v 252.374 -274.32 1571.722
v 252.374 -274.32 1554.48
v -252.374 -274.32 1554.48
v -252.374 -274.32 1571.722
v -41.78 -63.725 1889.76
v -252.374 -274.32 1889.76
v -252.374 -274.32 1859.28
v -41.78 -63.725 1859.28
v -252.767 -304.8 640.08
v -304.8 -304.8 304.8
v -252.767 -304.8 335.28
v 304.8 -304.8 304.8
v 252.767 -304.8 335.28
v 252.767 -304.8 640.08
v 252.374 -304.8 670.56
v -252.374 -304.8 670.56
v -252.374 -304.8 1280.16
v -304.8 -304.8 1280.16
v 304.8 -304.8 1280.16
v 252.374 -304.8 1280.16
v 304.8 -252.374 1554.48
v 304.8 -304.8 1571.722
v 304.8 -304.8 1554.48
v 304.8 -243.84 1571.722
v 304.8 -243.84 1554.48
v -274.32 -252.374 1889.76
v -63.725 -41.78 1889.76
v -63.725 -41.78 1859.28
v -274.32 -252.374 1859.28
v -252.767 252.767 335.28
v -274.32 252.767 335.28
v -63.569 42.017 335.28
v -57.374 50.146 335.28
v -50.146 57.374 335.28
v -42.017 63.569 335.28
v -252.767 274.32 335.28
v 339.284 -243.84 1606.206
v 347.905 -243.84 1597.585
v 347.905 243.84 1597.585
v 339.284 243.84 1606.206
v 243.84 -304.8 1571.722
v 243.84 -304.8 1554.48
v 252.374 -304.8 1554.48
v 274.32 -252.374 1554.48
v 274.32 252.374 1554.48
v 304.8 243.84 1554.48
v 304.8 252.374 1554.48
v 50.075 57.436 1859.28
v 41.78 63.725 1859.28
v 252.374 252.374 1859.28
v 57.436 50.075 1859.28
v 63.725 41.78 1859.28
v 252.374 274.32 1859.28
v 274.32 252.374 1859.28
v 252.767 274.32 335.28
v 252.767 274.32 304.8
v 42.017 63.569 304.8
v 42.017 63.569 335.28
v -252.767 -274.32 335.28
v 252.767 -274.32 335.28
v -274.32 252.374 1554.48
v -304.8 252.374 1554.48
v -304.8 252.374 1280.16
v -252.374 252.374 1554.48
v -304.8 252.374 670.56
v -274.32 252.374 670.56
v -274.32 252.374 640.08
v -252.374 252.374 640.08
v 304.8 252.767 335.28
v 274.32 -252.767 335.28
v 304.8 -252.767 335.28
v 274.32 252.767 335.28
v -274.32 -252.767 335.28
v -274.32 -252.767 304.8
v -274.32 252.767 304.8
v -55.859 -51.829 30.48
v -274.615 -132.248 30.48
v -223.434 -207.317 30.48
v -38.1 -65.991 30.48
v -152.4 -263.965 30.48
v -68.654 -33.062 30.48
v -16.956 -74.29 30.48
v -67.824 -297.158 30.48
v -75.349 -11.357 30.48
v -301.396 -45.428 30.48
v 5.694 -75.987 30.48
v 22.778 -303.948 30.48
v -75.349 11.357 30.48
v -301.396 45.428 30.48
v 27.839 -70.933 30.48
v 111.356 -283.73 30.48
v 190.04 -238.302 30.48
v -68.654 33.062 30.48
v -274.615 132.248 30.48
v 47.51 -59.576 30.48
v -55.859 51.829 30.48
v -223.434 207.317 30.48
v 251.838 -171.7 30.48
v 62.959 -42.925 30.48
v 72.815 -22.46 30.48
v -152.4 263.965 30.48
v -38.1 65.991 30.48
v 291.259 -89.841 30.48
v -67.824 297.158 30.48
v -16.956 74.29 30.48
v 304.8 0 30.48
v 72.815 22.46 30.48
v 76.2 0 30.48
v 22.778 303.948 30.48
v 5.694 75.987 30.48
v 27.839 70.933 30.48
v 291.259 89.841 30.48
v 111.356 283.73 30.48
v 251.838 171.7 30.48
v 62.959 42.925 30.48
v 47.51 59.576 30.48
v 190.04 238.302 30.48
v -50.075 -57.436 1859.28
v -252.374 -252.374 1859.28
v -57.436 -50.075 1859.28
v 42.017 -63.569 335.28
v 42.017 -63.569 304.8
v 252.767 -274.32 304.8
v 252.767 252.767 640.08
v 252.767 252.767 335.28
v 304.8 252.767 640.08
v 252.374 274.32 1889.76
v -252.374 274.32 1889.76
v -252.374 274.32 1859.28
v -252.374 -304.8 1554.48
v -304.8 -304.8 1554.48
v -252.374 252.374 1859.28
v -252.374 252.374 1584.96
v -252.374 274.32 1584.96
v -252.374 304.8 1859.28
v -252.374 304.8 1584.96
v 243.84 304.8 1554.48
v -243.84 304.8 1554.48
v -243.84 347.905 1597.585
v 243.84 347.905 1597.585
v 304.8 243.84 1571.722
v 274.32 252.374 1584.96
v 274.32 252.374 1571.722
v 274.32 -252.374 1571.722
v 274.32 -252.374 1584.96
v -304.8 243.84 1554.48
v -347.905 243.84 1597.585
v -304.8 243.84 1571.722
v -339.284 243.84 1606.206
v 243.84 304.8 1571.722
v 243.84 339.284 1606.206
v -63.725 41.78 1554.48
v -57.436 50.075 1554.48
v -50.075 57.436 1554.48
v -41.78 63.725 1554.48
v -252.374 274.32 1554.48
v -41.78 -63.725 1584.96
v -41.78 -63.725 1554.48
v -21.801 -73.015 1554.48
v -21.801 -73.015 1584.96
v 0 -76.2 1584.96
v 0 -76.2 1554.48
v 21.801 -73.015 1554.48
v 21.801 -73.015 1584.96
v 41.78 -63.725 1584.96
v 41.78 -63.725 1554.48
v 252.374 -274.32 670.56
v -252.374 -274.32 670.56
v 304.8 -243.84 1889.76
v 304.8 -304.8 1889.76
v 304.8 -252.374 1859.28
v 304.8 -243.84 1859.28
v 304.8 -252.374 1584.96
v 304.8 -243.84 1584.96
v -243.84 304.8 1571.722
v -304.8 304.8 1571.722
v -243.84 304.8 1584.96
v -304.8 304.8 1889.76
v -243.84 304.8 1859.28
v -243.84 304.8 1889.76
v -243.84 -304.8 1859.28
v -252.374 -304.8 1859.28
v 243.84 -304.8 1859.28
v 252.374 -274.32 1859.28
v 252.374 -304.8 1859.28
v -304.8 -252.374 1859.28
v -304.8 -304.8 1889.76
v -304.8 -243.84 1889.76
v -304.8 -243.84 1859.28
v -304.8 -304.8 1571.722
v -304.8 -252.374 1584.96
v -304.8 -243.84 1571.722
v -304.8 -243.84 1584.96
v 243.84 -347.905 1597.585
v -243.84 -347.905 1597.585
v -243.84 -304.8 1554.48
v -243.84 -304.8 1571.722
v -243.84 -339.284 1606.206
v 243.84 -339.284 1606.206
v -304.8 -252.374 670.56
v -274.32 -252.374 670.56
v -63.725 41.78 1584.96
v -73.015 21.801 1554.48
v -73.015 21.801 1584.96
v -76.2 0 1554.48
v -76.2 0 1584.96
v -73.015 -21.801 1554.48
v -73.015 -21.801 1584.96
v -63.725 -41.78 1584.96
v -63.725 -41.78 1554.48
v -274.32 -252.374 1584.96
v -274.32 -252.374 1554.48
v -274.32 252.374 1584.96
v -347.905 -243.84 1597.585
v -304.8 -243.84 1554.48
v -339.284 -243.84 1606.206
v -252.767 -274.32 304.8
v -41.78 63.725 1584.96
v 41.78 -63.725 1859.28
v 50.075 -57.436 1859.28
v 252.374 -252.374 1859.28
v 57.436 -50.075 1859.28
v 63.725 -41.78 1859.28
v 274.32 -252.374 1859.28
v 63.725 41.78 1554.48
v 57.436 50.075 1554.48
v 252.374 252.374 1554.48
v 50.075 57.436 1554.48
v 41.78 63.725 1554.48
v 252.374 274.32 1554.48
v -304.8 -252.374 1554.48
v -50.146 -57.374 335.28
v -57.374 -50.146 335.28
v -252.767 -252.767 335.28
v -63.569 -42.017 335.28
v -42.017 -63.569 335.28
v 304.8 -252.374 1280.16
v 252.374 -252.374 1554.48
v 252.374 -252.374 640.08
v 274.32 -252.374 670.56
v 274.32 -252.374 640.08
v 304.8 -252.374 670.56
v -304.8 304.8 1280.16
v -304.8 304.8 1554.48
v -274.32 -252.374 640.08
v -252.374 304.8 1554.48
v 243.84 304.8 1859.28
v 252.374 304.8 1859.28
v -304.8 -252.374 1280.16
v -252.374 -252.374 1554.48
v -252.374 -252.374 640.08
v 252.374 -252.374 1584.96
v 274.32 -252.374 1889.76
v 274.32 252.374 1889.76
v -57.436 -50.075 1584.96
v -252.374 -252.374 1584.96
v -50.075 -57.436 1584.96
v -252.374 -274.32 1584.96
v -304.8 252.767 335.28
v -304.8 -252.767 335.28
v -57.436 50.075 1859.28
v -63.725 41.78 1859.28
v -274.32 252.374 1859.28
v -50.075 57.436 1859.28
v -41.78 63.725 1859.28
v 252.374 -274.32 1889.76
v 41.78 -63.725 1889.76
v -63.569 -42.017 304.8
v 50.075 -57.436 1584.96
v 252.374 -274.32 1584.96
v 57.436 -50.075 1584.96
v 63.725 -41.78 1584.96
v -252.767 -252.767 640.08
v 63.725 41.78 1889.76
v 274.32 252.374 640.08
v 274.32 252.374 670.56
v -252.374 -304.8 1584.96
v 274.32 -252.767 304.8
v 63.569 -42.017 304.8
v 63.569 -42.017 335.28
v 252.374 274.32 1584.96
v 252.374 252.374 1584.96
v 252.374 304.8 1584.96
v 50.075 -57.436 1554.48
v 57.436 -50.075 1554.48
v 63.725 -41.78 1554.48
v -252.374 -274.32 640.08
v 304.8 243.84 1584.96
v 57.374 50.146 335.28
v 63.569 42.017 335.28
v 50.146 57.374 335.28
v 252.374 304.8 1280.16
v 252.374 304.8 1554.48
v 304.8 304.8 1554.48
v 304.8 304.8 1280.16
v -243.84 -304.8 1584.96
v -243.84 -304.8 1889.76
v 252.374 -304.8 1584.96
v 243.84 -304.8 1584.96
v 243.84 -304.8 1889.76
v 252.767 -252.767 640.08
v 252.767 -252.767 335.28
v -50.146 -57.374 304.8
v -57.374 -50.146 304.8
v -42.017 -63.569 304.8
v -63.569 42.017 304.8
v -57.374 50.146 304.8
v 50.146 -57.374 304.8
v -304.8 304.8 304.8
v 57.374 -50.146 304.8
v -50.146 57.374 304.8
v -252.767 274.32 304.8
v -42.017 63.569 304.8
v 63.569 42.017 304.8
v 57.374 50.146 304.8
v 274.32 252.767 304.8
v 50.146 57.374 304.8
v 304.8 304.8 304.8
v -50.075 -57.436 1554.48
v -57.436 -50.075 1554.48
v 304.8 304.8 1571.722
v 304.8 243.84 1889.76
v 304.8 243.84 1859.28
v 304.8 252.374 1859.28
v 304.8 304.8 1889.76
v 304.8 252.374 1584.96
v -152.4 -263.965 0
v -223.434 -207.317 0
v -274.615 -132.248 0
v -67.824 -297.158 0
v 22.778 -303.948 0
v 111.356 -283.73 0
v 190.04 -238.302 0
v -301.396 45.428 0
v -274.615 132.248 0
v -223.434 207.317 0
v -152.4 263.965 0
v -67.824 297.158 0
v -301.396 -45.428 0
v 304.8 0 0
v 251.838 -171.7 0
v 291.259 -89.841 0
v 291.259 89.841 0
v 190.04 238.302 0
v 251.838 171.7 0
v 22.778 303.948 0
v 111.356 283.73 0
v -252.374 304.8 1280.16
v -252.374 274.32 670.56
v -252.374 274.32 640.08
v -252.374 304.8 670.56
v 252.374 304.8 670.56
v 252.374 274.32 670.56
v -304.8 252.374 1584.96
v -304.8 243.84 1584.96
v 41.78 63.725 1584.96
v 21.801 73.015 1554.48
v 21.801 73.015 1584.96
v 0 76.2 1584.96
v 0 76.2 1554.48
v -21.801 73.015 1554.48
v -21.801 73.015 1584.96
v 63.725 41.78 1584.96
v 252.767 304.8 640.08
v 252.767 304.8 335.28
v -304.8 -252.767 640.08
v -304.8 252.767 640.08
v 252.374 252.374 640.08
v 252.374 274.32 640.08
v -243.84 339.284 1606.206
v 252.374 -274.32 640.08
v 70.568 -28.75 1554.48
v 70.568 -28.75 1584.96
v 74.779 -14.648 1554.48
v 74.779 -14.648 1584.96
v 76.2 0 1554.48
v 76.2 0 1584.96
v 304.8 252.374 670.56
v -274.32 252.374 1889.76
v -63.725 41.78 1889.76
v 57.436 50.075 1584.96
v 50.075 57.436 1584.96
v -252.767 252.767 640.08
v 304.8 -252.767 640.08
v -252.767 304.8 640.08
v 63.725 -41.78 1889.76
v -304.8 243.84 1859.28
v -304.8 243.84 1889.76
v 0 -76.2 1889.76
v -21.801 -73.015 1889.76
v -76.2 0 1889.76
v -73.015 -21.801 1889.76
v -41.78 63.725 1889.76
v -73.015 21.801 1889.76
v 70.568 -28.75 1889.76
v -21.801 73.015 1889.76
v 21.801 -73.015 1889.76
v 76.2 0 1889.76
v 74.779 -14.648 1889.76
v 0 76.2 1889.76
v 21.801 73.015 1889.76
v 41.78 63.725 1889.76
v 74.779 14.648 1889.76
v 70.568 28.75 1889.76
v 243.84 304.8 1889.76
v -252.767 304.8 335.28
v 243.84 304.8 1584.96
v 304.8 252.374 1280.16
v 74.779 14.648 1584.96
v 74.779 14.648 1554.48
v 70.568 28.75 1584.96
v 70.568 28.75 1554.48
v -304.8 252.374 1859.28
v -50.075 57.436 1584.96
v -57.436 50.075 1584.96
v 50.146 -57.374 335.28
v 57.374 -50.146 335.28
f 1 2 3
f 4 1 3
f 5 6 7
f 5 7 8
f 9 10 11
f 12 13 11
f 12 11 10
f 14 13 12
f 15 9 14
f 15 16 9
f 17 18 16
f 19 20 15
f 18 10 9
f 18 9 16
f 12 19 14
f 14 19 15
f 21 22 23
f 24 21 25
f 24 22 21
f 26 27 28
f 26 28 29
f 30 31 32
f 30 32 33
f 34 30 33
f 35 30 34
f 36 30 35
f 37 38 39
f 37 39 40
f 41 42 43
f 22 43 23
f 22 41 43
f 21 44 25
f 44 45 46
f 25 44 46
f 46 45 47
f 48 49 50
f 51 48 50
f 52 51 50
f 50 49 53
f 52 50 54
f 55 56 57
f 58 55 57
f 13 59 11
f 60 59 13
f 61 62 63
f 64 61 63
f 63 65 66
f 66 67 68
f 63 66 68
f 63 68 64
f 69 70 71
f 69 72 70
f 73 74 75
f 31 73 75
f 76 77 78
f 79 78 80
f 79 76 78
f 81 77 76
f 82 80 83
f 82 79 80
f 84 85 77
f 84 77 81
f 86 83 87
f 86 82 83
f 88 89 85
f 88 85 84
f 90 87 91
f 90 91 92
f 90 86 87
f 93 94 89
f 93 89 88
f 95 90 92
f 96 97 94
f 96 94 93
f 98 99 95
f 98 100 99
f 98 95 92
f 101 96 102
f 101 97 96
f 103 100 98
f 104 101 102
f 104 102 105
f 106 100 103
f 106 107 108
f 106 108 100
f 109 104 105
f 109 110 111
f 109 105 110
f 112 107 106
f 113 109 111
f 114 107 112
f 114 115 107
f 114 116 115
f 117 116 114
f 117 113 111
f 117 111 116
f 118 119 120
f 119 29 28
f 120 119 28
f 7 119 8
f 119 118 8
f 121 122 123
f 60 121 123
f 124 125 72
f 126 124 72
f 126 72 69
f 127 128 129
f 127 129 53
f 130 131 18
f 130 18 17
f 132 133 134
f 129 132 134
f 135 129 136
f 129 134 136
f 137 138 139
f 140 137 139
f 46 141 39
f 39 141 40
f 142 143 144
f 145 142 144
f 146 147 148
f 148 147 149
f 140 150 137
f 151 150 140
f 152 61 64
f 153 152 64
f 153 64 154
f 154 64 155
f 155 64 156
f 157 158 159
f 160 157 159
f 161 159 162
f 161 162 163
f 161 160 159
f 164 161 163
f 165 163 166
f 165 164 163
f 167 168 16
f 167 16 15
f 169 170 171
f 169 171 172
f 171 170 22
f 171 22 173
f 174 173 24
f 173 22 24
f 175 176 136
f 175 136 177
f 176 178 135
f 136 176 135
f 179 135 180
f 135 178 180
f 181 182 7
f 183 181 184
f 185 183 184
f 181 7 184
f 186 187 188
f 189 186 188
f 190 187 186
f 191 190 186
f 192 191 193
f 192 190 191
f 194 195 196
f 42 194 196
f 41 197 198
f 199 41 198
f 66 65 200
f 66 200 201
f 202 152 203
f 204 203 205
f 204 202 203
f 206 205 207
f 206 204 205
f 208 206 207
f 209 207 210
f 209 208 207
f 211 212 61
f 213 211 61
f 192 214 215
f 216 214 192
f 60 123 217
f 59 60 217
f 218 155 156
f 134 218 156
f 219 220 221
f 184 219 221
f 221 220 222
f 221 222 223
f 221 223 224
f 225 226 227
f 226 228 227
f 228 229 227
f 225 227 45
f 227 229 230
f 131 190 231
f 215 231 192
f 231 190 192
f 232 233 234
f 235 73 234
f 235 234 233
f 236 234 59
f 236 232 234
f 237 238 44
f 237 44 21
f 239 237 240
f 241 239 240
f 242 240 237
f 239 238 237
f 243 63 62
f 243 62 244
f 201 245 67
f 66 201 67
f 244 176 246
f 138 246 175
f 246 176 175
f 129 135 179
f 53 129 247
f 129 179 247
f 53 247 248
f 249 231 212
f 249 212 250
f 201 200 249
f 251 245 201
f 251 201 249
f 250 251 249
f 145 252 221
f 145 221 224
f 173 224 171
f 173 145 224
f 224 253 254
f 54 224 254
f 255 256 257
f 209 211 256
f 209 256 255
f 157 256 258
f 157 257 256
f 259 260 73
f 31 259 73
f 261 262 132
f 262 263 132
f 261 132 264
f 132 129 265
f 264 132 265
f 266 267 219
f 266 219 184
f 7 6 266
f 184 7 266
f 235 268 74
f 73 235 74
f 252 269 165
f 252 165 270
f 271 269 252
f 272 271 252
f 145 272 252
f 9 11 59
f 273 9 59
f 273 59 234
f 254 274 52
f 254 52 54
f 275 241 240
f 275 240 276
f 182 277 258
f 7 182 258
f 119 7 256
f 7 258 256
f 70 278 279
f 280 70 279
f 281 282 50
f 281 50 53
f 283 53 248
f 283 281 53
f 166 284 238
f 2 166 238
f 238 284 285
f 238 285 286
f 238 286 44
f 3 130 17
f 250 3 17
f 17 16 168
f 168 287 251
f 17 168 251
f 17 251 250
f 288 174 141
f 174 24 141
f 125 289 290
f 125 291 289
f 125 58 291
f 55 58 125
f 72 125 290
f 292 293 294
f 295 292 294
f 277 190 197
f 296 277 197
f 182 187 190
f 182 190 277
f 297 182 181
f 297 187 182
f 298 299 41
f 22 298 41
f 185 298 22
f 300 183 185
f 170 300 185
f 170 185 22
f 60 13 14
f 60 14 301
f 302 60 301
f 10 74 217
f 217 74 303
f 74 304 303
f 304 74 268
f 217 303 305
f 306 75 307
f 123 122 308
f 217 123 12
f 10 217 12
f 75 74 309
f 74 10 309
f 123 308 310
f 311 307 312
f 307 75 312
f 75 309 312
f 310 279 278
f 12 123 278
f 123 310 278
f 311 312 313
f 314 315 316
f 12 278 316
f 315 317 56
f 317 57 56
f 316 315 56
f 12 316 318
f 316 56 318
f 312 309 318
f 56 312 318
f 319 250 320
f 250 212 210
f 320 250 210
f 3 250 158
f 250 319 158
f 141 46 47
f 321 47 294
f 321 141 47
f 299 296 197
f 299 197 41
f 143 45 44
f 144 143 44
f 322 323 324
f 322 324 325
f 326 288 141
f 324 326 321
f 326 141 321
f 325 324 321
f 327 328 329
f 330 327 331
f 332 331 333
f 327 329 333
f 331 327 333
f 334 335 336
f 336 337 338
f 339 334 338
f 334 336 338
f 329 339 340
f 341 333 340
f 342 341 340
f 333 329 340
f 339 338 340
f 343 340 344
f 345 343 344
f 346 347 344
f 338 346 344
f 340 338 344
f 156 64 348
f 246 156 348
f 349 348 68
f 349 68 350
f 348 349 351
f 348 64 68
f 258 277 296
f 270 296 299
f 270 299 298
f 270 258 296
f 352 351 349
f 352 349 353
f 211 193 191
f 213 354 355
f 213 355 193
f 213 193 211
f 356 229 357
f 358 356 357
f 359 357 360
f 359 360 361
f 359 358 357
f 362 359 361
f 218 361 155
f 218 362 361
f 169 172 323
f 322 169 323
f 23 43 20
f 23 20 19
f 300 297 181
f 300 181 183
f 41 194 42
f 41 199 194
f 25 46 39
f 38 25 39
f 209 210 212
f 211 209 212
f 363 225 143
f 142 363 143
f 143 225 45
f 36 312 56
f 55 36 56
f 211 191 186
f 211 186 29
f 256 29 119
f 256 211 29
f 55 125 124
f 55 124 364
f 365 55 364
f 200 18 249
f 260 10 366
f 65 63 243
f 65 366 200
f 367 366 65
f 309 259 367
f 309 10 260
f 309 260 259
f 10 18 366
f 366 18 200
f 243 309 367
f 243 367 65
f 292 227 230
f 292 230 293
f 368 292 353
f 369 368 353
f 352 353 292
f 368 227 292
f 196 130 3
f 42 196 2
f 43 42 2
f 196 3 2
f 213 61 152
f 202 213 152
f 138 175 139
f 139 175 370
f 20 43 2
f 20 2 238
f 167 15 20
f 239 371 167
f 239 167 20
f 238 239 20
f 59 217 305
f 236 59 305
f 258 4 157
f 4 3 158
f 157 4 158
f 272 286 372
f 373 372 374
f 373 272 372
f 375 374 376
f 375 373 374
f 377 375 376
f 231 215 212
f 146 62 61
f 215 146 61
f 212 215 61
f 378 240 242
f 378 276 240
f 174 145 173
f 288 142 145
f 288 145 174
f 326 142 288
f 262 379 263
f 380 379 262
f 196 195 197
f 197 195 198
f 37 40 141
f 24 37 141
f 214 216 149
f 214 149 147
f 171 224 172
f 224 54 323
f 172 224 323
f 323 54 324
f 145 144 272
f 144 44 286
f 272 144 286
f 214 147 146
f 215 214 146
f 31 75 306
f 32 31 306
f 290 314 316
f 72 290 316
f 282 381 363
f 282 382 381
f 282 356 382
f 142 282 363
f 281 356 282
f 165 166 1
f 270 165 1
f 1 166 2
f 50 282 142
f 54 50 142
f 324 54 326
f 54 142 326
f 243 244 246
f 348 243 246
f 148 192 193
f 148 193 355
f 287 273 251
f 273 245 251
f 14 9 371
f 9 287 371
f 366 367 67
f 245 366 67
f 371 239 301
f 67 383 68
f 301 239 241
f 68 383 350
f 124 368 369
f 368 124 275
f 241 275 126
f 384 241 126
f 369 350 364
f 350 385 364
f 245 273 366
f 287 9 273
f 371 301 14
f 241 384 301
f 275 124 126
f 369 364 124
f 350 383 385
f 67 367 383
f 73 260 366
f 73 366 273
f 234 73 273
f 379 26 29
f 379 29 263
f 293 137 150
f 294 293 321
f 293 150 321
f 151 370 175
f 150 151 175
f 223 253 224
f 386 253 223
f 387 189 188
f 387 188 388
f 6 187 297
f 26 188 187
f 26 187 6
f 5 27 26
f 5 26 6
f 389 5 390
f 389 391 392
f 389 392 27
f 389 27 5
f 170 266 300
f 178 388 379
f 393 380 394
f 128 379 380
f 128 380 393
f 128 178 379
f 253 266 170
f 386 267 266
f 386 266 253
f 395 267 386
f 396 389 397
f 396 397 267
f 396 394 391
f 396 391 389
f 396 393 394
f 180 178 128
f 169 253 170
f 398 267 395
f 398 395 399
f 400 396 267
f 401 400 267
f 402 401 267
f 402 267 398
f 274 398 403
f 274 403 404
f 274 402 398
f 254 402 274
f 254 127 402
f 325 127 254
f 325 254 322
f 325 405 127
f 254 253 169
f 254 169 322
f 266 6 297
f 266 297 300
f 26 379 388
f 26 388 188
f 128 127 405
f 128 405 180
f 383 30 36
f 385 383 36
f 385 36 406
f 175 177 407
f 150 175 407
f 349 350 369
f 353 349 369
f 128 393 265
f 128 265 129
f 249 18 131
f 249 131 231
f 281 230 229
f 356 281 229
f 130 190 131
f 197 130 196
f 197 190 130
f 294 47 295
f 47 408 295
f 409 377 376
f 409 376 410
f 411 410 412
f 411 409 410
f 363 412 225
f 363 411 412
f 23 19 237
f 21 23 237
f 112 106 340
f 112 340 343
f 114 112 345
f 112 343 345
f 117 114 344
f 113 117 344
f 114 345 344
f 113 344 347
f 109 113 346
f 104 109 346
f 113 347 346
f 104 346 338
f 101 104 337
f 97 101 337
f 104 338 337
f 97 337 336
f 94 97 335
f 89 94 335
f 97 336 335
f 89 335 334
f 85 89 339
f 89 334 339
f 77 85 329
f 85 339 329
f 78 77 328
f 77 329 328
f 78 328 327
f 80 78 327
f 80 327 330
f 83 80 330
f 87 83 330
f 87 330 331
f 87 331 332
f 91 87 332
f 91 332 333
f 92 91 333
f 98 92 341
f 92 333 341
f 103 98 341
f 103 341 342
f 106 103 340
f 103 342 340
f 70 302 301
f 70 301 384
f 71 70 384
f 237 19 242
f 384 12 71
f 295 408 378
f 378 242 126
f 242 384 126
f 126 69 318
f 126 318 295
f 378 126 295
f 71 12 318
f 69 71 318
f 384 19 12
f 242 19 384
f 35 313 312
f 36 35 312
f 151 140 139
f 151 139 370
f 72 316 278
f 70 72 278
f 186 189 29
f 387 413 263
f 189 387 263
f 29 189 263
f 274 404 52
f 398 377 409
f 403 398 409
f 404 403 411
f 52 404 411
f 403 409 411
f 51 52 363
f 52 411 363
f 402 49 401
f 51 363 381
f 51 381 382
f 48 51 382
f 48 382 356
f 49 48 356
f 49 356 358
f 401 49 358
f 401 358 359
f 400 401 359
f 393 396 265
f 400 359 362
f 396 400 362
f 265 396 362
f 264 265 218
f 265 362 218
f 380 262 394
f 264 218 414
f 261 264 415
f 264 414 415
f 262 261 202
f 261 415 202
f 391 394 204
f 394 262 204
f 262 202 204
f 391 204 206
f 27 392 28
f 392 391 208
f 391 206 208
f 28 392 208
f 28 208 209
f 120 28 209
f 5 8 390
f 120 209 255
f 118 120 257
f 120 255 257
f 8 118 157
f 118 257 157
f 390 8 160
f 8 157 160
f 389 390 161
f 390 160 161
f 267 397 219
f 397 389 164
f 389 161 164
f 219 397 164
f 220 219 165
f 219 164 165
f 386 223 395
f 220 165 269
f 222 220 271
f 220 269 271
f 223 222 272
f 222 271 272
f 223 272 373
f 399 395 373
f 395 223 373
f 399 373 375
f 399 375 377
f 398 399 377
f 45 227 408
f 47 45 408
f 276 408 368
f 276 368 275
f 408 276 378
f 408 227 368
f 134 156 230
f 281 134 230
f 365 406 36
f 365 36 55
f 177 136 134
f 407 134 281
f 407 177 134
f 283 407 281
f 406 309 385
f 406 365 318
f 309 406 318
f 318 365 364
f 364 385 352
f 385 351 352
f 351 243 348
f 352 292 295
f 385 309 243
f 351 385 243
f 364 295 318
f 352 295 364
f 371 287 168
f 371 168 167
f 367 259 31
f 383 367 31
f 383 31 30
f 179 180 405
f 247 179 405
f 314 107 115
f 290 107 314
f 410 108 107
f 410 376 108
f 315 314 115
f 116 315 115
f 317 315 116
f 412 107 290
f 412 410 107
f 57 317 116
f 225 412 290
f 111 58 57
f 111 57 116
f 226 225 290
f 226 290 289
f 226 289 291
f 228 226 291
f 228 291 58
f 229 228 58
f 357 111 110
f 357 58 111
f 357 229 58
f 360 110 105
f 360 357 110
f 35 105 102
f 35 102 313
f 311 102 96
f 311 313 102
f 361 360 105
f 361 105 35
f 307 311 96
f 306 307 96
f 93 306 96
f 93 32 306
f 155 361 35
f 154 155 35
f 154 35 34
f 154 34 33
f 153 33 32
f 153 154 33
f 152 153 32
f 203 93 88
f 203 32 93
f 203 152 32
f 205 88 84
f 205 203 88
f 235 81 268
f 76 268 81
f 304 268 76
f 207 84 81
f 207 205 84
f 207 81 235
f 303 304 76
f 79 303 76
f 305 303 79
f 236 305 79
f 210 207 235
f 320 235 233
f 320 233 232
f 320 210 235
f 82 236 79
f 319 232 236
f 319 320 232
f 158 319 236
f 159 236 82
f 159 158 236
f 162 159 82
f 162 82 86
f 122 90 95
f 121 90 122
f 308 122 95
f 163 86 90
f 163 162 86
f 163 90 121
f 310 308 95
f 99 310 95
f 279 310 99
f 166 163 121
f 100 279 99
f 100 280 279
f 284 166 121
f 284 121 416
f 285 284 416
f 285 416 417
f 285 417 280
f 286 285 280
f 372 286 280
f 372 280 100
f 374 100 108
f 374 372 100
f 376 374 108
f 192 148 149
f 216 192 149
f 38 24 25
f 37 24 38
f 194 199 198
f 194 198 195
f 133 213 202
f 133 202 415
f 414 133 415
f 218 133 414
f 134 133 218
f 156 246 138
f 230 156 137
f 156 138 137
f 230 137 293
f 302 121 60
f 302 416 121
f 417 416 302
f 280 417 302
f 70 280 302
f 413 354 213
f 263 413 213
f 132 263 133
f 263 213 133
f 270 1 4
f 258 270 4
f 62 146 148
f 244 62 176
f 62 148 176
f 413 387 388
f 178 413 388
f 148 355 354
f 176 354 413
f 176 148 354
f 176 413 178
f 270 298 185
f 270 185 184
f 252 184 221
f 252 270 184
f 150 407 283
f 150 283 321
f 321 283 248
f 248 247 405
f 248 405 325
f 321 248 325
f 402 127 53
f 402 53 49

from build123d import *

# Parameters (mm, degrees)
F0_R           = 304.8
F1_DEPTH       = 30.48
F2_R           = 76.2
F3_DEPTH       = 274.32
F4_W           = 609.6
F4_H           = 609.6
F5_DEPTH       = 30.48
F6_R           = 76.2
F6_W           = 52.0326146906
F6_H           = 52.0326146906
F7_DEPTH       = 304.8
F7_DEPTH_BACK  = 30.48
F8_W           = 609.6
F8_H           = 609.6
F8_W_2         = 548.64
F8_H_2         = 548.64
F9_DEPTH       = 30.48
F10_W          = 52.4256
F10_H          = 52.4256
F10_R          = 76.2
F11_DEPTH      = 914.4
F13_DEPTH      = 30.48
F14_W          = 52.4256
F14_H          = 52.4256
F14_R          = 76.2
F15_DEPTH      = 304.8
F15_DEPTH_BACK = 30.48
F16_W          = 609.6
F16_H          = 609.6
F16_W_2        = 548.64
F16_H_2        = 548.64
F17_DEPTH      = 30.48
F20_DEPTH      = 609.6
F22_DEPTH      = 609.6
F23_DEPTH      = 30.48
F24_W          = 60.96
F24_H          = 72.17660923
F24_H_2        = 60.96
F24_H_3        = 74.9131180763
F24_W_2        = 86.0498287201
F24_W_3        = 73.7356283188
F24_H_4        = 73.4948553562
F24_H_5        = 80.3360976696
F24_W_4        = 73.3040608883
F25_DEPTH      = 609.6


# Not quite as in the source:
# - a feature names something its author has since deleted; it is built from what else it names


with BuildPart() as f1:
    # F0 (on Top) → F1 (new body)
    with BuildSketch(Plane.XY):
        Circle(F0_R)
    extrude(amount=F1_DEPTH)

    # F2 (on face) → F3 (join)
    with BuildSketch(Plane.XY.offset(30.48)):
        Circle(F2_R)
    extrude(amount=F3_DEPTH)

    # F4 (on face) → F5 (join)
    with BuildSketch(Plane.XY.offset(304.8)):
        Rectangle(F4_W, F4_H)
        Polygon((-21.5526146906, 0), (-274.32, -252.7673853094), (-274.32, 252.7673853094), align=None, mode=Mode.SUBTRACT)
        Polygon((0, -21.5526146906), (252.7673853094, -274.32), (-252.7673853094, -274.32), align=None, mode=Mode.SUBTRACT)
        Polygon((-252.7673853094, 274.32), (252.7673853094, 274.32), (0, 21.5526146906), align=None, mode=Mode.SUBTRACT)
        Polygon((274.32, 252.7673853094), (274.32, -252.7673853094), (21.5526146906, 0), align=None, mode=Mode.SUBTRACT)
    extrude(amount=F5_DEPTH)

    # F6 (on face) → F7 (join, two sides)
    with BuildSketch(Plane.XY.offset(335.28)) as f7_sk:
        Circle(F6_R)
        with Locations((-278.7836926547, 278.7836926547)):
            Rectangle(F6_W, F6_H)
        with Locations((278.7836926547, 278.7836926547)):
            Rectangle(F6_W, F6_H)
        with Locations((278.7836926547, -278.7836926547)):
            Rectangle(F6_W, F6_H)
        with Locations((-278.7836926547, -278.7836926547)):
            Rectangle(F6_W, F6_H)
    extrude(amount=F7_DEPTH)
    extrude(f7_sk.sketch, amount=-F7_DEPTH_BACK)

    # F8 (on face) → F9 (join)
    with BuildSketch(Plane.XY.offset(640.08)):
        Rectangle(F8_W, F8_H)
        Rectangle(F8_W_2, F8_H_2, mode=Mode.SUBTRACT)
    extrude(amount=F9_DEPTH)

    # F10 (on face) → F11 (join)
    with BuildSketch(Plane.XY.offset(640.08)):
        with Locations((-278.5872, 278.5872)):
            Rectangle(F10_W, F10_H)
        with Locations((-278.5872, -278.5872)):
            Rectangle(F10_W, F10_H)
        with Locations((278.5872, 278.5872)):
            Rectangle(F10_W, F10_H)
        with Locations((278.5872, -278.5872)):
            Rectangle(F10_W, F10_H)
        Circle(F10_R)
    extrude(amount=F11_DEPTH)

    # F12 (on face) → F13 (join)
    with BuildSketch(Plane.XY.offset(1554.48)):
        Polygon((252.3744, -304.8), (304.8, -304.8), (304.8, -252.3744), (304.8, 252.3744), (304.8, 304.8), (252.3744, 304.8), (-252.3744, 304.8), (-304.8, 304.8), (-304.8, 252.3744), (-304.8, -252.3744), (-304.8, -304.8), (-252.3744, -304.8), align=None)
        Polygon((252.3744, -274.32), (-252.3744, -274.32), (0, -21.9456), align=None, mode=Mode.SUBTRACT)
        Polygon((-274.32, -252.3744), (-274.32, 252.3744), (-21.9456, 0), align=None, mode=Mode.SUBTRACT)
        Polygon((21.9456, 0), (274.32, 252.3744), (274.32, -252.3744), align=None, mode=Mode.SUBTRACT)
        Polygon((0, 21.9456), (-252.3744, 274.32), (252.3744, 274.32), align=None, mode=Mode.SUBTRACT)
    extrude(amount=F13_DEPTH)

    # F14 (on face) → F15 (join, two sides)
    with BuildSketch(Plane.XY.offset(1584.96)) as f15_sk:
        with Locations((-278.5872, 278.5872)):
            Rectangle(F14_W, F14_H)
        with Locations((278.5872, 278.5872)):
            Rectangle(F14_W, F14_H)
        with Locations((278.5872, -278.5872)):
            Rectangle(F14_W, F14_H)
        with Locations((-278.5872, -278.5872)):
            Rectangle(F14_W, F14_H)
        Circle(F14_R)
    extrude(amount=F15_DEPTH)
    extrude(f15_sk.sketch, amount=-F15_DEPTH_BACK)

    # F16 (on face) → F17 (join)
    with BuildSketch(Plane.XY.offset(1889.76)):
        Rectangle(F16_W, F16_H)
        Rectangle(F16_W_2, F16_H_2, mode=Mode.SUBTRACT)
    extrude(amount=-F17_DEPTH)

    # F19 (on face) → F20 (join)
    with BuildSketch(Plane.XZ.offset(304.8)):
        Polygon((-347.9052293811, 1597.5852293811), (-304.8, 1554.48), (-274.32, 1554.48), (-274.32, 1571.7220917525), (-304.8, 1571.7220917525), (-339.2841835049, 1606.2062752574), align=None)
        Polygon((274.32, 1554.48), (304.8, 1554.48), (347.9052293811, 1597.5852293811), (339.2841835049, 1606.2062752574), (304.8, 1571.7220917525), (274.32, 1571.7220917525), align=None)
    extrude(amount=-F20_DEPTH)

    # F21 (on face) → F22 (join)
    with BuildSketch(Plane.YZ.offset(304.8)):
        Polygon((274.32, 1571.7220917525), (274.32, 1554.48), (304.8, 1554.48), (347.9052293811, 1597.5852293811), (339.2841835049, 1606.2062752574), (304.8, 1571.7220917525), align=None)
        Polygon((-304.8, 1554.48), (-274.32, 1554.48), (-274.32, 1571.7220917525), (-304.8, 1571.7220917525), (-339.2841835049, 1606.2062752574), (-347.9052293811, 1597.5852293811), align=None)
    extrude(amount=-F22_DEPTH)

    # F18 (on face) → F23 (join)
    with BuildSketch(Plane.XY.offset(1889.76)):
        Polygon((0, 21.9456), (-252.3744, 274.32), (-274.32, 274.32), (-274.32, 252.3744), (-21.9456, 0), (-274.32, -252.3744), (-274.32, -274.32), (-252.3744, -274.32), (0, -21.9456), (252.3744, -274.32), (274.32, -274.32), (274.32, -252.3744), (21.9456, 0), (274.32, 252.3744), (274.32, 274.32), (252.3744, 274.32), align=None)
    extrude(amount=-F23_DEPTH)

    # F24 (on face) → F25 (cut)
    with BuildSketch(Plane.XY.offset(1889.76)):
        with Locations((-274.32, 340.888304615)):
            Rectangle(F24_W, F24_H)
        with Locations((-335.28, 274.32)):
            Rectangle(F24_W, F24_H_2)
        with Locations((274.32, 342.2565590382)):
            Rectangle(F24_W, F24_H_3)
        with Locations((347.82491436, 274.32)):
            Rectangle(F24_W_2, F24_H_2)
        with Locations((341.6678141594, -274.32)):
            Rectangle(F24_W_3, F24_H_2)
        with Locations((274.32, -341.5474276781)):
            Rectangle(F24_W, F24_H_4)
        with Locations((-274.32, -344.9680488348)):
            Rectangle(F24_W, F24_H_5)
        with Locations((-341.4520304441, -274.32)):
            Rectangle(F24_W_4, F24_H_2)
    extrude(amount=-F25_DEPTH, mode=Mode.SUBTRACT)


solid = f1.part
